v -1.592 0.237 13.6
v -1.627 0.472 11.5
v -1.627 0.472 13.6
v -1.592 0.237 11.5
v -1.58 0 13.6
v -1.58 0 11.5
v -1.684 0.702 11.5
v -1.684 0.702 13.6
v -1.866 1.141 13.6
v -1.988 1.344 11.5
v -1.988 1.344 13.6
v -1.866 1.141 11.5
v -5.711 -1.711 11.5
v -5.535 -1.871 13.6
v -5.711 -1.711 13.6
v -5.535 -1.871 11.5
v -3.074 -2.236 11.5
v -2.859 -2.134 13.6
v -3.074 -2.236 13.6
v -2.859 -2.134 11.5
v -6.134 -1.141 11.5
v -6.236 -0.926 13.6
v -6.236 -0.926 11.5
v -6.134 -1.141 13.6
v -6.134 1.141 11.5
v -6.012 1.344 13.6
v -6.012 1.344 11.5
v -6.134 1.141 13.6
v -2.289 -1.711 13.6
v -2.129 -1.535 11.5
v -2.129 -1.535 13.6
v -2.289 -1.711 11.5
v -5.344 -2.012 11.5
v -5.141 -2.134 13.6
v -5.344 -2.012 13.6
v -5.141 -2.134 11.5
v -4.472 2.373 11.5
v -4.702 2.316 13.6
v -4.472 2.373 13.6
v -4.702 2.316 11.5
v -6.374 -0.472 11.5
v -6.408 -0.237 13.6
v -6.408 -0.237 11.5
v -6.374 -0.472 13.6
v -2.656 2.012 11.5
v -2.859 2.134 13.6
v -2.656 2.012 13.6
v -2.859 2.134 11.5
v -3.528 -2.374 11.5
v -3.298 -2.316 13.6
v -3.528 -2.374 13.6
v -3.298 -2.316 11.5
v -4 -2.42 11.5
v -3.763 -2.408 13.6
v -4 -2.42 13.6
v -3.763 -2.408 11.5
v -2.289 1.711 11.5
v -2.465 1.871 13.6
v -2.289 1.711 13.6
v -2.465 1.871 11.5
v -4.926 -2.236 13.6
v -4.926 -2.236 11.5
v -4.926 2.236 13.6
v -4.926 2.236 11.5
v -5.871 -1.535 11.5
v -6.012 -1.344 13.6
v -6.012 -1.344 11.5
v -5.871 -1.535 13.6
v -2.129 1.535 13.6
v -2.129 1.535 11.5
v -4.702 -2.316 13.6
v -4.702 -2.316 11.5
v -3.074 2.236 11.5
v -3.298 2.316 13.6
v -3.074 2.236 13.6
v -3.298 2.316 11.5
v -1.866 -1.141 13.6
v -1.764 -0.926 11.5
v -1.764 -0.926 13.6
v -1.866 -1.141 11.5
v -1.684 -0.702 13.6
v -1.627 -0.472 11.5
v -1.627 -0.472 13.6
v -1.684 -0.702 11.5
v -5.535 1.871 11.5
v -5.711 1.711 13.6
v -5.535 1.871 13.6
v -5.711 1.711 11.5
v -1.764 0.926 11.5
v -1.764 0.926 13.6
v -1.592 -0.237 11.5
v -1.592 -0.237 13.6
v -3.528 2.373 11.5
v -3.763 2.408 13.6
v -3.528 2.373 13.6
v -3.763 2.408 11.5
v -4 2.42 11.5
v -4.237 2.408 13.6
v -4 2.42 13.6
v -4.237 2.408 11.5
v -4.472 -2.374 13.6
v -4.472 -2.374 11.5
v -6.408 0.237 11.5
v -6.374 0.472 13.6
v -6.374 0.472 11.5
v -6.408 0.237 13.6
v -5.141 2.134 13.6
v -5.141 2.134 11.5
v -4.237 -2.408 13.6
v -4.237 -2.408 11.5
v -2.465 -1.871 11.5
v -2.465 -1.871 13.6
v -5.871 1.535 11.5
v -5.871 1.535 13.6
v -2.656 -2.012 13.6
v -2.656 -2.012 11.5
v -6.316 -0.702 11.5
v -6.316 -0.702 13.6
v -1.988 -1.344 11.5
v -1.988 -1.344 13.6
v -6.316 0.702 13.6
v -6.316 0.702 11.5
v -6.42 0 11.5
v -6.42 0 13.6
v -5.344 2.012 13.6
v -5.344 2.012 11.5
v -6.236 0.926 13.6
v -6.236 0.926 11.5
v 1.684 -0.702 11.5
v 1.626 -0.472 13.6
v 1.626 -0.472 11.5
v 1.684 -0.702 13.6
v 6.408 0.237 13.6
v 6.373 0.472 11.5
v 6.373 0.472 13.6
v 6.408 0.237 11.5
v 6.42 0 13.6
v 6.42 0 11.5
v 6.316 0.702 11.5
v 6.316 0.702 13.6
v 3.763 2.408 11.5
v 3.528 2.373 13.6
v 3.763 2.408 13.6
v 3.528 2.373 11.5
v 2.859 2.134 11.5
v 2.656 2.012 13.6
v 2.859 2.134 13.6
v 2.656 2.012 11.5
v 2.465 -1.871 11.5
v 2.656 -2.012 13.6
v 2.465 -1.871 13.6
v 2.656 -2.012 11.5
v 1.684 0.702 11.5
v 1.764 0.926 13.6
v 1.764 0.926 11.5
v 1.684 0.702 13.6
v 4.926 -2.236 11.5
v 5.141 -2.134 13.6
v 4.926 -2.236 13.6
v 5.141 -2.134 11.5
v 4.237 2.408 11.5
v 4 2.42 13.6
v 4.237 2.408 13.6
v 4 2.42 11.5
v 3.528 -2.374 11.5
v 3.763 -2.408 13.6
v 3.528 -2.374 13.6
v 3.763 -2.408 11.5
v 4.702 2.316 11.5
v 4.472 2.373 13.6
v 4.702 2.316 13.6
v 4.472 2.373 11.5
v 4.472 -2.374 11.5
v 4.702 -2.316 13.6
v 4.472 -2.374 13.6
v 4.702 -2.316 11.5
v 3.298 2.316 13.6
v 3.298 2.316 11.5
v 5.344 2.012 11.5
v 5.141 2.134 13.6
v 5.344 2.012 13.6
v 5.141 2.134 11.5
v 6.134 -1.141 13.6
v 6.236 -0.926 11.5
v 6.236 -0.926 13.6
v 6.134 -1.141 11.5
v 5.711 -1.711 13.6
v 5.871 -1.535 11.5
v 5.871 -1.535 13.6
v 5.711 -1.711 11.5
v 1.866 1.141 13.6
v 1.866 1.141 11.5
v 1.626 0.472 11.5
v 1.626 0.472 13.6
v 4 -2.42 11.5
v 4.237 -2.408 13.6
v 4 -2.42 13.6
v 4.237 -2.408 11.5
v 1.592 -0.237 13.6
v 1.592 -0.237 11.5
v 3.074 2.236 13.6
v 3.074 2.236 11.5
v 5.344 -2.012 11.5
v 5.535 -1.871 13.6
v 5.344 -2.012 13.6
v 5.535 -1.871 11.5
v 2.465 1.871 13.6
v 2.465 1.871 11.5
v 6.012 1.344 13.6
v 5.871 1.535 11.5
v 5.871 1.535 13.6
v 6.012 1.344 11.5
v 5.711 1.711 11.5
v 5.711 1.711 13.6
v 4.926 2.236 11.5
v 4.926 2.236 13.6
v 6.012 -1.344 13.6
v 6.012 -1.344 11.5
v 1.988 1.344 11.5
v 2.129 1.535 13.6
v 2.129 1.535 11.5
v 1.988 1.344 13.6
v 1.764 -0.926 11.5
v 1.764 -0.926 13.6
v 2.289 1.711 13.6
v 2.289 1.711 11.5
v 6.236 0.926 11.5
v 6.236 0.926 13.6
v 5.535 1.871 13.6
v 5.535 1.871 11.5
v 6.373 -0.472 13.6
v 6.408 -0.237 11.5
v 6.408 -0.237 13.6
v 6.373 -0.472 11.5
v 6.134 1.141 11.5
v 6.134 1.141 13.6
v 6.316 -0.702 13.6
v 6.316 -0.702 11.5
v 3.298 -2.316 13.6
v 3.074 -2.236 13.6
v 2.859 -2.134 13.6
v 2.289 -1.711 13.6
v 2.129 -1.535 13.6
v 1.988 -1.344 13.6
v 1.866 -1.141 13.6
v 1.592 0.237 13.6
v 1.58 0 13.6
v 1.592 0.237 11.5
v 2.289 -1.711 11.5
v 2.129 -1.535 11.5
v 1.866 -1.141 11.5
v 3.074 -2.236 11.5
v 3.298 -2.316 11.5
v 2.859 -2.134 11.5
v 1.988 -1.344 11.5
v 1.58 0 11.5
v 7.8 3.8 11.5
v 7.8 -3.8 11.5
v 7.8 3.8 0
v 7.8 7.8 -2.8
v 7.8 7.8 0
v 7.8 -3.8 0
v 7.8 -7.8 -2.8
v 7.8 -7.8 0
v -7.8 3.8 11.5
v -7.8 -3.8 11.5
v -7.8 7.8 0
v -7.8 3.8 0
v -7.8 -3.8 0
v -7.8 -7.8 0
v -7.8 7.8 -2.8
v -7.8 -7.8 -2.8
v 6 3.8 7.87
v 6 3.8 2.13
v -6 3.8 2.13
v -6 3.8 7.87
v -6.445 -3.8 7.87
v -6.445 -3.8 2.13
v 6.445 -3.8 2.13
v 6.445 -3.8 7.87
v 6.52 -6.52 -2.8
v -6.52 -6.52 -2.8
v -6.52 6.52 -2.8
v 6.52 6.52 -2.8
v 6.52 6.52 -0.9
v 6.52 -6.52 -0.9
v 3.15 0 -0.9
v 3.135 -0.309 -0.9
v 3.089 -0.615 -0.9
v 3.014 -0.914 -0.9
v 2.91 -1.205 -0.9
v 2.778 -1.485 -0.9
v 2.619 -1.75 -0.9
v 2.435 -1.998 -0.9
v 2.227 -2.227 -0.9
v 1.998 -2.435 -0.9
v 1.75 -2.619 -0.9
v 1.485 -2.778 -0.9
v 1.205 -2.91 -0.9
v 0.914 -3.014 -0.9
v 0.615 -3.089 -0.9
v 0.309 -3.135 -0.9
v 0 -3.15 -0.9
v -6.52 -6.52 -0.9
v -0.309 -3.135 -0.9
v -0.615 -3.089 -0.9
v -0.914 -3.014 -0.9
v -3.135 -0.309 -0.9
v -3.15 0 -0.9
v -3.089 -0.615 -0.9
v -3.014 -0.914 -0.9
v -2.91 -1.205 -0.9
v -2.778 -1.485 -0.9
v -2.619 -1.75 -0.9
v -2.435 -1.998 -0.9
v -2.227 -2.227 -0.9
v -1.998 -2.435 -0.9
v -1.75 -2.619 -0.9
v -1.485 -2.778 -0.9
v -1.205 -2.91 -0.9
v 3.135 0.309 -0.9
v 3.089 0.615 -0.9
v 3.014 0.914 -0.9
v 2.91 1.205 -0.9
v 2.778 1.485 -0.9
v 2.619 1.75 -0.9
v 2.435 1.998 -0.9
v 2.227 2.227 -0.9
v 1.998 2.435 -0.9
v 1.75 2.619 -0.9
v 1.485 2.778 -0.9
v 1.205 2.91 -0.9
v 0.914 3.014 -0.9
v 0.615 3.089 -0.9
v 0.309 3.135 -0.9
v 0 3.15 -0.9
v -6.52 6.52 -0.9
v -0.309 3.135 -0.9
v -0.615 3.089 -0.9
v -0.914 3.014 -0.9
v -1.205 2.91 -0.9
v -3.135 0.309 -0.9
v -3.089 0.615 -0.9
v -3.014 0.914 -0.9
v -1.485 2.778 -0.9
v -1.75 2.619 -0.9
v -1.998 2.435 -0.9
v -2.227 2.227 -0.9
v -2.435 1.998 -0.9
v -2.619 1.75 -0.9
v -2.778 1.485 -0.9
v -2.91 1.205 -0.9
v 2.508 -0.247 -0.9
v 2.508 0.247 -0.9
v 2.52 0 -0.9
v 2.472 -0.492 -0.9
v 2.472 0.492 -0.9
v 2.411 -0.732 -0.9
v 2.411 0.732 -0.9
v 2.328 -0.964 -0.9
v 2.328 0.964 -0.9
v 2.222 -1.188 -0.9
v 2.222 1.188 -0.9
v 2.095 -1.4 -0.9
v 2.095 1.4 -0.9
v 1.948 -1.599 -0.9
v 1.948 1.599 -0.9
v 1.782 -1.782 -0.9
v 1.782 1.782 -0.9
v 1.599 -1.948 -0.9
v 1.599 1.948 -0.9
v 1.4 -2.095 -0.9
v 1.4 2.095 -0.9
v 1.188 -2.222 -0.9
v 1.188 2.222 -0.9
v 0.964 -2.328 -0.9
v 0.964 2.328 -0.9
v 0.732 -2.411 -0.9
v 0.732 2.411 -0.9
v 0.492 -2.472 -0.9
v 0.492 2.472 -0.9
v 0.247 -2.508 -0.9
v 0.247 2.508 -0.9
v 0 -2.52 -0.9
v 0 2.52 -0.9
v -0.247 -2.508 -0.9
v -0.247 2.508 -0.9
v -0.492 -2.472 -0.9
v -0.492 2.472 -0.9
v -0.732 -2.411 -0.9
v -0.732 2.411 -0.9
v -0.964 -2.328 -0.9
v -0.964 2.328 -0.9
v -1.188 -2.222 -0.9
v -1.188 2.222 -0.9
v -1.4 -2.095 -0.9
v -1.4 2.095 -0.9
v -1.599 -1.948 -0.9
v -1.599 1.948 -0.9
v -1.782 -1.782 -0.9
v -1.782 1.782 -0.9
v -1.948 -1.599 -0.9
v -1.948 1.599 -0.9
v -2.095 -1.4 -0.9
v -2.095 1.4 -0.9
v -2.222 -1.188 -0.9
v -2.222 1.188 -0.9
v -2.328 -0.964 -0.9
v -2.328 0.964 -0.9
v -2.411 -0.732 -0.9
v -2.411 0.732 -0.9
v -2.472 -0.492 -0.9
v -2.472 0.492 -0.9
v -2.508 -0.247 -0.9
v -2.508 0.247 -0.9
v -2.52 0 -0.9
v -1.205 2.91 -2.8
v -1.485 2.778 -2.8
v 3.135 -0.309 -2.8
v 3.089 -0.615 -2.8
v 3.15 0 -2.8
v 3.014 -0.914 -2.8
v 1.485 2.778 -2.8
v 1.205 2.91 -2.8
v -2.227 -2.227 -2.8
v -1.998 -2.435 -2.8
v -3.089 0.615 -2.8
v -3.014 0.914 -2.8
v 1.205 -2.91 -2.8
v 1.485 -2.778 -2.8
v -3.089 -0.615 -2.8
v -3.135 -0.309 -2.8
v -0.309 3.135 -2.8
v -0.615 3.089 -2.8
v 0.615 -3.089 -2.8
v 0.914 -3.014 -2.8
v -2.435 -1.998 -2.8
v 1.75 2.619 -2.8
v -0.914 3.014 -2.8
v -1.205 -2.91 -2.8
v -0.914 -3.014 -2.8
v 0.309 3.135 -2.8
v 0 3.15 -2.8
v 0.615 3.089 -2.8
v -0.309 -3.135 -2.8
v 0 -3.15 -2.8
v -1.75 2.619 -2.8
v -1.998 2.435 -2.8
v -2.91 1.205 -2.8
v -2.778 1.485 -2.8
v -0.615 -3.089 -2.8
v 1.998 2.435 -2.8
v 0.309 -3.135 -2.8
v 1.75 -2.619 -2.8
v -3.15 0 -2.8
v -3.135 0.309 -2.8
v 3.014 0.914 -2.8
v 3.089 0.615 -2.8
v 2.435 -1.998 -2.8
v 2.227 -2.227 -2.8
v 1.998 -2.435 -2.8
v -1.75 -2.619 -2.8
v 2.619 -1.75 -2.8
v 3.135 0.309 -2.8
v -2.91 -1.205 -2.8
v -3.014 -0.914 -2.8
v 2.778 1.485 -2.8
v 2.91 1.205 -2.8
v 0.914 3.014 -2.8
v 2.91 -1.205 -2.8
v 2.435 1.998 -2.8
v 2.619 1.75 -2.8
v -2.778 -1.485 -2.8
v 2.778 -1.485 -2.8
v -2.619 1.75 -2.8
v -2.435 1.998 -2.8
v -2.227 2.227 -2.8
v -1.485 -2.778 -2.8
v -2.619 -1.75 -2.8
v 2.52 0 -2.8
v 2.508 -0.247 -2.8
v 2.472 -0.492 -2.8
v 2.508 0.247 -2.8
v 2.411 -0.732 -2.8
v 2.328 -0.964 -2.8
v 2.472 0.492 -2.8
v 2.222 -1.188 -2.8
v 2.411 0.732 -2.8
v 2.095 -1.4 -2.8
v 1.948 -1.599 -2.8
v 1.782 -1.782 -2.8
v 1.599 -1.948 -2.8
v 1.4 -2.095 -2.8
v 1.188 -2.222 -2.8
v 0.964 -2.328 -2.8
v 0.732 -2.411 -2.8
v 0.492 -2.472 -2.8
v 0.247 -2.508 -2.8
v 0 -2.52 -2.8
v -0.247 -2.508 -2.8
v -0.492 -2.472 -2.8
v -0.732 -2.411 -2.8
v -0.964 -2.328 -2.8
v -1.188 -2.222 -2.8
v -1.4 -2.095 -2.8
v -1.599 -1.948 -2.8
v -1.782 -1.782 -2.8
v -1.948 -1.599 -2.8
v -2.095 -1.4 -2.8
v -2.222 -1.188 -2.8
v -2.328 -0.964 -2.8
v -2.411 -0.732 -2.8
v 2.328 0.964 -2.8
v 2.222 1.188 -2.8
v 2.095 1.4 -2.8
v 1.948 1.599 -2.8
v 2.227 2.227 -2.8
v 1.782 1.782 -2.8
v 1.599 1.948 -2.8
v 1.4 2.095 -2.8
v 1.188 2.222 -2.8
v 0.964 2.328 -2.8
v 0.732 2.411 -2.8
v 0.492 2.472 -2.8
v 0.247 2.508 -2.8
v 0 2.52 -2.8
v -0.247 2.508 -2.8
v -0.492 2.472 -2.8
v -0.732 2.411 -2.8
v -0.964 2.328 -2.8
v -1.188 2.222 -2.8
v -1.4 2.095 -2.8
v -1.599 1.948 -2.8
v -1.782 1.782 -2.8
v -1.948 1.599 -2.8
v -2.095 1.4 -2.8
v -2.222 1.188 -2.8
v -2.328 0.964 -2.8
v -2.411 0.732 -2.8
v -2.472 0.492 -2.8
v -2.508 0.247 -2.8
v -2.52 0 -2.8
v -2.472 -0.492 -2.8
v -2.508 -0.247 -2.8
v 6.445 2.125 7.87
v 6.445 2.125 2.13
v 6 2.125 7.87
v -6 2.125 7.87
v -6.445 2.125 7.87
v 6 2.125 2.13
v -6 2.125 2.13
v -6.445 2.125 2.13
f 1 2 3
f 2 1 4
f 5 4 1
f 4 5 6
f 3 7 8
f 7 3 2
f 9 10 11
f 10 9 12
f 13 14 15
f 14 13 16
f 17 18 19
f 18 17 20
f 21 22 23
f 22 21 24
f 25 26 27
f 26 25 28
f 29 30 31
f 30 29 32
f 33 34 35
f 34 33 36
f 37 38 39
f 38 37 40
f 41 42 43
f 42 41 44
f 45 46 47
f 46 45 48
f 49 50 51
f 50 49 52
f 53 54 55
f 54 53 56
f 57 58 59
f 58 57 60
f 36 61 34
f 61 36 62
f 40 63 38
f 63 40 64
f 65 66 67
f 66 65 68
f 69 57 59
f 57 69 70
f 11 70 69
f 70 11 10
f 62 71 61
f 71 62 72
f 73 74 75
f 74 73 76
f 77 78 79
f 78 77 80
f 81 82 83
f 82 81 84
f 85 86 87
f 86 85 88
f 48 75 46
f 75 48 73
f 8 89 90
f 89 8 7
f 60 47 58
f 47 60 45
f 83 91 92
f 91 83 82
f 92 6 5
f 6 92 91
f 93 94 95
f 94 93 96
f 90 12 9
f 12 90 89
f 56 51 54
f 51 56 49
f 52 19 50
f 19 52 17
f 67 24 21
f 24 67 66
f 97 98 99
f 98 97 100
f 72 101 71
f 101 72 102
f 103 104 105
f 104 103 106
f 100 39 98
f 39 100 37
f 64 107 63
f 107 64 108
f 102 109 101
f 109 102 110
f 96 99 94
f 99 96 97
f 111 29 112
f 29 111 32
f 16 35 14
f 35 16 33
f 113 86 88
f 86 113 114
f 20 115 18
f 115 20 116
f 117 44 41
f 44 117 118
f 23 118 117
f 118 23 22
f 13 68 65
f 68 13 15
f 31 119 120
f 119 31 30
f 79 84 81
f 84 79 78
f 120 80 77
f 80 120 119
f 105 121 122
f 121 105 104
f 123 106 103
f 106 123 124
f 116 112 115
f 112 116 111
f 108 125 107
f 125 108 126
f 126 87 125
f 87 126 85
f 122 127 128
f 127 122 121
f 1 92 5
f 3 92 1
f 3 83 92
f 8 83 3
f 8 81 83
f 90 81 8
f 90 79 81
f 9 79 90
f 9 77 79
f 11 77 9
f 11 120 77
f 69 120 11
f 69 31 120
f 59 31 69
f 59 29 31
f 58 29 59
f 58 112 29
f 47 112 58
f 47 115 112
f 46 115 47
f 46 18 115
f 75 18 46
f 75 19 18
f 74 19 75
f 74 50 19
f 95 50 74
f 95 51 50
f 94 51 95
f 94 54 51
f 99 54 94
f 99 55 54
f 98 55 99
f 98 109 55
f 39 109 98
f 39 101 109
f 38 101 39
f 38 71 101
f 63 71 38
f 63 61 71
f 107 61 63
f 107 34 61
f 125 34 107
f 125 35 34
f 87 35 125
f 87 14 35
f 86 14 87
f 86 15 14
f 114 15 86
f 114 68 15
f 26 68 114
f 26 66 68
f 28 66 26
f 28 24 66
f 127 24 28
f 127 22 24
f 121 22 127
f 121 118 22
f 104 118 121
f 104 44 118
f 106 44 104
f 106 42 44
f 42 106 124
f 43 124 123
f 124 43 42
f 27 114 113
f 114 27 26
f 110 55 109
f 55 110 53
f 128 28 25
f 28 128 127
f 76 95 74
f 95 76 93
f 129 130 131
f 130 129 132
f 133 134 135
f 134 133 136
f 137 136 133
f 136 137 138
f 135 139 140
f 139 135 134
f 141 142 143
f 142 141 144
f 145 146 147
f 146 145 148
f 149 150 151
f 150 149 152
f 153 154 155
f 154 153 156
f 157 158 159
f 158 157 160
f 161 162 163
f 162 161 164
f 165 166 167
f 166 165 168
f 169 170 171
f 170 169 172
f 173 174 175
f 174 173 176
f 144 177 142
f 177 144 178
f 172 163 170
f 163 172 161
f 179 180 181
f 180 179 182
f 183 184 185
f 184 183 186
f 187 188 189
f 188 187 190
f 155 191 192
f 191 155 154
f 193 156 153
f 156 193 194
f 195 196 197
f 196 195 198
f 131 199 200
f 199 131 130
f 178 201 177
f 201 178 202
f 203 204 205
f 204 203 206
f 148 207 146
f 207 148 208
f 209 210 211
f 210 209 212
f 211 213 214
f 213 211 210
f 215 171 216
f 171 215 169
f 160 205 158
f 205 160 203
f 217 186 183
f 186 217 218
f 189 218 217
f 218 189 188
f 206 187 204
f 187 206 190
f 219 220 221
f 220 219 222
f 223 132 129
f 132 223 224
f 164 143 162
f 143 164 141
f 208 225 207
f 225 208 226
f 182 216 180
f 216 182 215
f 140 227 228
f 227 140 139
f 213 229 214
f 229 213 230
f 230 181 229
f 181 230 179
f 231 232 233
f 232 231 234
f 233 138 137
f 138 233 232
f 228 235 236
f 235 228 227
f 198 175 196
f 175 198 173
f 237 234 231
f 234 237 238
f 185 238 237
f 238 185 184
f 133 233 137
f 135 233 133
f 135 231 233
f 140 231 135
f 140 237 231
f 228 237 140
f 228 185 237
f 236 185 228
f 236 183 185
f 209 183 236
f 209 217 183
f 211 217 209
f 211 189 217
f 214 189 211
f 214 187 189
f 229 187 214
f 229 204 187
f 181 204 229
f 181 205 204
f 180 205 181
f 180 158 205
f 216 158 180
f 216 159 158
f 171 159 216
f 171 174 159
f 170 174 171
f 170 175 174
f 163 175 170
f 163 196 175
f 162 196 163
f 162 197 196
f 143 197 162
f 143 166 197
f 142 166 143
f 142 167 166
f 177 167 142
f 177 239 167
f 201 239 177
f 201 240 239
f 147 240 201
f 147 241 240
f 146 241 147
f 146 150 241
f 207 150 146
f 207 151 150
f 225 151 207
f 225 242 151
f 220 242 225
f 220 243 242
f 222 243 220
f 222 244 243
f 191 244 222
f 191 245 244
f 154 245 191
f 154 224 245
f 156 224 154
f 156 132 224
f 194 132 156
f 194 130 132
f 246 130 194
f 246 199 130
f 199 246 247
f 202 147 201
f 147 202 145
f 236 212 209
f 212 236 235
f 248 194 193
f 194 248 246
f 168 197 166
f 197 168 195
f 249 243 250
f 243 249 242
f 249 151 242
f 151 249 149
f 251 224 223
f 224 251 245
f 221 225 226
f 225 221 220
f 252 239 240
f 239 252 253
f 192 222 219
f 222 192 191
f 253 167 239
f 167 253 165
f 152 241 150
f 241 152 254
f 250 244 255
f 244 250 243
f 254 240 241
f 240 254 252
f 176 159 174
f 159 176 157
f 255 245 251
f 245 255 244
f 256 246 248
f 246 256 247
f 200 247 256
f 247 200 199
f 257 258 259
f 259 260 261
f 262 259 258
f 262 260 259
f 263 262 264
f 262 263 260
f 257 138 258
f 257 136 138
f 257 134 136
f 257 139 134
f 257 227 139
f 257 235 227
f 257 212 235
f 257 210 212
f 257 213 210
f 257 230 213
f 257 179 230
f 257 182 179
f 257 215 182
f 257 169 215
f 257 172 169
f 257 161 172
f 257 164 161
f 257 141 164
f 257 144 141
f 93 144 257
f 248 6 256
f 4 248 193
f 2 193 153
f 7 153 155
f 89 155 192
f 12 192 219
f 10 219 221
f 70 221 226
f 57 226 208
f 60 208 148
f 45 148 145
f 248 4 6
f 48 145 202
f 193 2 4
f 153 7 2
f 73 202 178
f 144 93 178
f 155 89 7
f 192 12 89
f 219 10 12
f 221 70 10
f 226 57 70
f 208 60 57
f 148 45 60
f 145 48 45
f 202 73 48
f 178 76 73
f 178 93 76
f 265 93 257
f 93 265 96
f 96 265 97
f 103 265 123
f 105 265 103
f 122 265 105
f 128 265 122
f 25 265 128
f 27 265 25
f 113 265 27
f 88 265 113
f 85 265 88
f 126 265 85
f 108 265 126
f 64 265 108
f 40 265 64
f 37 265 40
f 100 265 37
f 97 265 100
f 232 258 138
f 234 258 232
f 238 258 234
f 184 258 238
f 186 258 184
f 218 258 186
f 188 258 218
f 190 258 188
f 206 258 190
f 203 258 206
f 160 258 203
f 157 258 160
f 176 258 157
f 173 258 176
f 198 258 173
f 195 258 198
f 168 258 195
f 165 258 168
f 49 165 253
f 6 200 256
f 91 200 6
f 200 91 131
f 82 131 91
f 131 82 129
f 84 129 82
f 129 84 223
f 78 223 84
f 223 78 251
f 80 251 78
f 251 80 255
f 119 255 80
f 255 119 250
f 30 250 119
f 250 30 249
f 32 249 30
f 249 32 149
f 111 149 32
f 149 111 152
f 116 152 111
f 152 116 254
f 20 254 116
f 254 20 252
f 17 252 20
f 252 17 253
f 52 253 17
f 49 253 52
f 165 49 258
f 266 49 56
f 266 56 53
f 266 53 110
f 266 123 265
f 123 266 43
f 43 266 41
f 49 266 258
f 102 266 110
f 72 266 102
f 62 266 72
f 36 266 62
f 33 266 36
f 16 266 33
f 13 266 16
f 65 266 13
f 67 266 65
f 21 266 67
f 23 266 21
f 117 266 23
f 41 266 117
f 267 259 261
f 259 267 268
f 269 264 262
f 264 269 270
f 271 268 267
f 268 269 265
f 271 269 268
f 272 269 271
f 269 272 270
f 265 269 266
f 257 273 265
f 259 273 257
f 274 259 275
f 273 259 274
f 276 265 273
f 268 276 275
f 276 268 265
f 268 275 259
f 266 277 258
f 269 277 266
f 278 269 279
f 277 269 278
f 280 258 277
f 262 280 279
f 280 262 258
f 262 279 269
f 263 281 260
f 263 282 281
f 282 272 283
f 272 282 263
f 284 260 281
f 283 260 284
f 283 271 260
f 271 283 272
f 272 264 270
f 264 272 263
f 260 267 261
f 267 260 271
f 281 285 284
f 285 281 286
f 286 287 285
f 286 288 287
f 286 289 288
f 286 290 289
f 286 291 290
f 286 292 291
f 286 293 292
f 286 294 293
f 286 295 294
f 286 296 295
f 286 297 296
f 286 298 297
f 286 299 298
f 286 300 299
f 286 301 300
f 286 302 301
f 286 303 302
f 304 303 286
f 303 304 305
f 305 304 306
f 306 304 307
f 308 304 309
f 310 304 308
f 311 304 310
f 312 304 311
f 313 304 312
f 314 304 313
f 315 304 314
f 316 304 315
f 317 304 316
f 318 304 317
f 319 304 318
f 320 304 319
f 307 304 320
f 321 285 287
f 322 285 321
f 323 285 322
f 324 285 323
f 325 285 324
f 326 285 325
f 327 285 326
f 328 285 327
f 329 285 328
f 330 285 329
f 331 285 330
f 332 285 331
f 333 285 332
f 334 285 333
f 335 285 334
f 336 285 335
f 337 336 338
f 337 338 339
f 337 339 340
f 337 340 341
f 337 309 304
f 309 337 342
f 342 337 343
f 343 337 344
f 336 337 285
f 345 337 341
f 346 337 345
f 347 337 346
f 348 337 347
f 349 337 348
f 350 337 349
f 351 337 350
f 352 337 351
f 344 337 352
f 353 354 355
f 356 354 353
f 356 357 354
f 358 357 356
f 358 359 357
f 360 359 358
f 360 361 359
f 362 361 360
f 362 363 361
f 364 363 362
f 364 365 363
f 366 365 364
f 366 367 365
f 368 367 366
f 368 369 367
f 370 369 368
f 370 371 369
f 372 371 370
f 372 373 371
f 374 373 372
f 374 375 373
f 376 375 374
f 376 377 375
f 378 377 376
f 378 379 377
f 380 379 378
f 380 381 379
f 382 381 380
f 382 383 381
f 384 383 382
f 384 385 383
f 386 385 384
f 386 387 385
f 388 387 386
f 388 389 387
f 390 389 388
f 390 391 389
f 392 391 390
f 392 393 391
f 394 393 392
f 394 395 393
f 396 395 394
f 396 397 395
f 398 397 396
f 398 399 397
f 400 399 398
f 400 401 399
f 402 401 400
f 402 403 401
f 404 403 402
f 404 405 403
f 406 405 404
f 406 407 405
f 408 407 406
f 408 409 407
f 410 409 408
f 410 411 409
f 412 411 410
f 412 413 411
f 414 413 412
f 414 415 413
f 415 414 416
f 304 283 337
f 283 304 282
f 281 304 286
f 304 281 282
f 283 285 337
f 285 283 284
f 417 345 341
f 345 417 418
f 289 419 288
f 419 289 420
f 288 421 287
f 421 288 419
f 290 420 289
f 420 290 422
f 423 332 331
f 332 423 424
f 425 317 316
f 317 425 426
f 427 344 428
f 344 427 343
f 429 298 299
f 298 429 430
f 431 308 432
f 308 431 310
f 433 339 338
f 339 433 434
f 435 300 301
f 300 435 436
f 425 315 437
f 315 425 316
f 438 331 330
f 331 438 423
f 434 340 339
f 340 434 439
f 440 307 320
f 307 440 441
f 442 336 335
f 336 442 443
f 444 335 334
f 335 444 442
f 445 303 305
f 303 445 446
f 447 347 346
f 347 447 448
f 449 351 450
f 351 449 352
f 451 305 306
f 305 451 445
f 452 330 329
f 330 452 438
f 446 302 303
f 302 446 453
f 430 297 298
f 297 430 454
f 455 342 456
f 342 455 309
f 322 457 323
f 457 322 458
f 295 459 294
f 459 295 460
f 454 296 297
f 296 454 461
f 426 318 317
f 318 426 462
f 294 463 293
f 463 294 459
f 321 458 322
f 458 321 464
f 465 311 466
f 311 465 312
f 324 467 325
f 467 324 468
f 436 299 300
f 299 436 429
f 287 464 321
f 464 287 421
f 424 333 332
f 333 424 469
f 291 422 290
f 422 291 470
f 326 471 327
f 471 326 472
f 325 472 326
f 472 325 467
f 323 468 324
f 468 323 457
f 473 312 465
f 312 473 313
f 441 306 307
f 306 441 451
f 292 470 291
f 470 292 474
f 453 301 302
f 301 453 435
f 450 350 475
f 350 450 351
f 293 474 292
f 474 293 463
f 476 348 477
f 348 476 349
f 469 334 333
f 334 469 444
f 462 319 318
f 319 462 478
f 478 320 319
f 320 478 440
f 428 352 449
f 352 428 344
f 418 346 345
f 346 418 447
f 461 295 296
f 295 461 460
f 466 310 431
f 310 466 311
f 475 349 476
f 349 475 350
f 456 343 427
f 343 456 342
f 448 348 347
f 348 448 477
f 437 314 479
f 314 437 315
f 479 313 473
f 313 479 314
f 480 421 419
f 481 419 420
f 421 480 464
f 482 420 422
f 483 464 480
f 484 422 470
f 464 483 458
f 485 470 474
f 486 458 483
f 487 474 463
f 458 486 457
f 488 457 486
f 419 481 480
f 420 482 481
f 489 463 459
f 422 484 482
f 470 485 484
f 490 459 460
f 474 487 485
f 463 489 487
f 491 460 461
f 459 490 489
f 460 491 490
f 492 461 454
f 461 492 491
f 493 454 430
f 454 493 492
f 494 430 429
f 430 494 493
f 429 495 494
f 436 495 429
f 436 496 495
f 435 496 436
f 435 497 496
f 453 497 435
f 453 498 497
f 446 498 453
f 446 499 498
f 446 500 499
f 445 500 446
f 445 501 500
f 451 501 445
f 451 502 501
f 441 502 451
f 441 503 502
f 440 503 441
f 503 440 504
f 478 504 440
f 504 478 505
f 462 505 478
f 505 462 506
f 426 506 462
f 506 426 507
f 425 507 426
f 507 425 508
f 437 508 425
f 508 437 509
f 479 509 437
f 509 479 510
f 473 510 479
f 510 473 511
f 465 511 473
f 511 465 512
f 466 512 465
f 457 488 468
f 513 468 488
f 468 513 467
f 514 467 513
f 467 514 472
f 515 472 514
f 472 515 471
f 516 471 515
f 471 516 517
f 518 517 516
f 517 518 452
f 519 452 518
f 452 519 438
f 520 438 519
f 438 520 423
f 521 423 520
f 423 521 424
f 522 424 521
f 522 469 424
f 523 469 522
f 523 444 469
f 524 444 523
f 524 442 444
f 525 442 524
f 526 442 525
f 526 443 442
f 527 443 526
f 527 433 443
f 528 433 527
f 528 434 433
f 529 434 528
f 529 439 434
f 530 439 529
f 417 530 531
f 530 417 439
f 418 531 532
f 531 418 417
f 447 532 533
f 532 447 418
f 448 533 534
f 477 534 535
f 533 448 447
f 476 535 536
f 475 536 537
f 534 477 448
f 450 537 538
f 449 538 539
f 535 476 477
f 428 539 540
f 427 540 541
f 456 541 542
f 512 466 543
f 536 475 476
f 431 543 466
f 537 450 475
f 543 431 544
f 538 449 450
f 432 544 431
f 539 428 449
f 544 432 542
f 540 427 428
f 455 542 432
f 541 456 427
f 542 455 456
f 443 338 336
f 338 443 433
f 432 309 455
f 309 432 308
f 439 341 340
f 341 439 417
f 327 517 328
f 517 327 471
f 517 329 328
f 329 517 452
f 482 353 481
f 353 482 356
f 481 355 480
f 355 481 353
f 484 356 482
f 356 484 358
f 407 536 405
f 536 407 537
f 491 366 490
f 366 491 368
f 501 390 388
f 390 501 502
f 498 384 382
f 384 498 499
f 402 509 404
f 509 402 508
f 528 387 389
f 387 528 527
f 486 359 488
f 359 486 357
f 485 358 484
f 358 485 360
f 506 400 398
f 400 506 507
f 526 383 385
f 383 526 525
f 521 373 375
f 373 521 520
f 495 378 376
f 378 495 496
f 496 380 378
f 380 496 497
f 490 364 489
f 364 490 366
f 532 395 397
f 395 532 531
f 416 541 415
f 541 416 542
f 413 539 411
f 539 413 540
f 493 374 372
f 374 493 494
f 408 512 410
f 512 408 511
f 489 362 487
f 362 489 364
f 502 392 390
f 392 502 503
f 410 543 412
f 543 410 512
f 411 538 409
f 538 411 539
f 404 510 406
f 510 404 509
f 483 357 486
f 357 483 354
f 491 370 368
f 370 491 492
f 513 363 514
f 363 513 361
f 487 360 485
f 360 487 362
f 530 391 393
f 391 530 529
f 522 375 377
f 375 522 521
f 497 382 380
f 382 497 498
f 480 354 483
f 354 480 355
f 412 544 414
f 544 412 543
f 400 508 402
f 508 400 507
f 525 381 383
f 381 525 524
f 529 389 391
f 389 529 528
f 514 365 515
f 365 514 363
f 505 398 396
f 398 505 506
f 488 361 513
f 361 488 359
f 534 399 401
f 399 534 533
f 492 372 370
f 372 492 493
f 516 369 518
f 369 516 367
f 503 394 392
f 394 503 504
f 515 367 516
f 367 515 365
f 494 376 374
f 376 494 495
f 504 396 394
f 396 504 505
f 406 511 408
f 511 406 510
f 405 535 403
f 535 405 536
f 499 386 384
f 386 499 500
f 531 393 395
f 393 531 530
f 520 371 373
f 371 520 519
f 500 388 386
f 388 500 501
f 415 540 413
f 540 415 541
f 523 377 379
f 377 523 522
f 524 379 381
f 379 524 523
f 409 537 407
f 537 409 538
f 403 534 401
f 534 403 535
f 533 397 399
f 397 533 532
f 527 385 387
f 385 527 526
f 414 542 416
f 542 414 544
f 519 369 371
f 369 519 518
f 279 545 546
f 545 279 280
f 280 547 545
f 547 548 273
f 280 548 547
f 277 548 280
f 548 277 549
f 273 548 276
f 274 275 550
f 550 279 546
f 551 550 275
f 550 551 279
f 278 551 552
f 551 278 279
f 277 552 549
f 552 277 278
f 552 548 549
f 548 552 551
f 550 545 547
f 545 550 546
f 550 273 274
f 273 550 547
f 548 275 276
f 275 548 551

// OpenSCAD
//Settings for Plate
print_width = 0.4; 
stud_diameter = 4.84;
stud_height = 1.9;
base_height = 3.0;
base_width = 8;
stud_offset = 0.5 * base_width;
edge_offset = 0.2;
edge_width = 0.5*(base_width-stud_diameter-0.2);
ring_diameter_outer = 6.3;
ring_diameter_inner = stud_diameter+0.2;
z_offset = 0.2;

//Settings
height = 3.9;

//***********************************************************************
//***********************************************************************

// Lego Train Botton Plate

module makeStuds(x, y, dia = stud_diameter)
{
    for(xPos=[stud_offset:base_width:stud_offset + (x-1) * base_width])
        for(yPos = [stud_offset:base_width:stud_offset + (y-1) * base_width])
            translate([xPos, yPos, 0])
                cylinder(d = dia, h = stud_height+1, $fn=64);
}

module makeStandardLegoBrick(x,y,z,studs=true)
{
    translate([0,0,0.5*(z*base_height-z_offset)])
    cube([  x*base_width-2*edge_offset,
            y*base_width-2*edge_offset,
            z*base_height-z_offset],
            center=true             );
    if(studs)
    {
        translate([-0.5*x*base_width,-0.5*y*base_width,z*base_height-1])
        makeStuds(x,y);
    }
}

module makeStandardLegoBrickBottom(x,y,z)
{
    
    difference()
    {
        translate([0,0,0.5*(z*base_height-z_offset)])
        cube([  x*base_width-2*edge_offset,
                y*base_width-2*edge_offset,
                z*base_height-z_offset],
                center=true             );
        translate([0,0,0.5*(base_height) + z*base_height - stud_height - 0.2])
        cube([  x*base_width-2*edge_width,
                y*base_width-2*edge_width,
                base_height],
                center=true             );
    }
    
    translate([-0.5*x*base_width,-0.5*y*base_width,(z-1)*base_height-z_offset])
    makeLegoBottomRings(x, y);
}

module makeLegoBottomRings(x, y, dia_outer = ring_diameter_outer, dia_inner = ring_diameter_inner)
{
    for(xPos=[base_width:base_width:base_width + (x-2) * base_width])
        for(yPos = [base_width:base_width:base_width + (y-2) * base_width])
            translate([xPos, yPos, 0.5])
            difference()
            {
                cylinder(d = dia_outer, h = base_height-0.5, $fn=64);
                translate([0,0,-1.5])
                cylinder(d = dia_inner, h = base_height+2, $fn=64);
            }   
}

//***********************************************************************

module switchBox()
{
    translate([0,-1,5])
    #cube([12.89,6.25,5.74], center = true);
}
//***********************************************************************
module switchBox2()
{
    translate([0,5,5])
    #cube([12,6,5.74], center = true);
}


module switchHall()
{
makeStandardLegoBrick(2,1,height);
rotate([180,0,0])
makeStandardLegoBrickBottom(2,2,1);
}

//***********************************************************************


difference()
{
    switchHall();
    switchBox();
    switchBox2();
}
